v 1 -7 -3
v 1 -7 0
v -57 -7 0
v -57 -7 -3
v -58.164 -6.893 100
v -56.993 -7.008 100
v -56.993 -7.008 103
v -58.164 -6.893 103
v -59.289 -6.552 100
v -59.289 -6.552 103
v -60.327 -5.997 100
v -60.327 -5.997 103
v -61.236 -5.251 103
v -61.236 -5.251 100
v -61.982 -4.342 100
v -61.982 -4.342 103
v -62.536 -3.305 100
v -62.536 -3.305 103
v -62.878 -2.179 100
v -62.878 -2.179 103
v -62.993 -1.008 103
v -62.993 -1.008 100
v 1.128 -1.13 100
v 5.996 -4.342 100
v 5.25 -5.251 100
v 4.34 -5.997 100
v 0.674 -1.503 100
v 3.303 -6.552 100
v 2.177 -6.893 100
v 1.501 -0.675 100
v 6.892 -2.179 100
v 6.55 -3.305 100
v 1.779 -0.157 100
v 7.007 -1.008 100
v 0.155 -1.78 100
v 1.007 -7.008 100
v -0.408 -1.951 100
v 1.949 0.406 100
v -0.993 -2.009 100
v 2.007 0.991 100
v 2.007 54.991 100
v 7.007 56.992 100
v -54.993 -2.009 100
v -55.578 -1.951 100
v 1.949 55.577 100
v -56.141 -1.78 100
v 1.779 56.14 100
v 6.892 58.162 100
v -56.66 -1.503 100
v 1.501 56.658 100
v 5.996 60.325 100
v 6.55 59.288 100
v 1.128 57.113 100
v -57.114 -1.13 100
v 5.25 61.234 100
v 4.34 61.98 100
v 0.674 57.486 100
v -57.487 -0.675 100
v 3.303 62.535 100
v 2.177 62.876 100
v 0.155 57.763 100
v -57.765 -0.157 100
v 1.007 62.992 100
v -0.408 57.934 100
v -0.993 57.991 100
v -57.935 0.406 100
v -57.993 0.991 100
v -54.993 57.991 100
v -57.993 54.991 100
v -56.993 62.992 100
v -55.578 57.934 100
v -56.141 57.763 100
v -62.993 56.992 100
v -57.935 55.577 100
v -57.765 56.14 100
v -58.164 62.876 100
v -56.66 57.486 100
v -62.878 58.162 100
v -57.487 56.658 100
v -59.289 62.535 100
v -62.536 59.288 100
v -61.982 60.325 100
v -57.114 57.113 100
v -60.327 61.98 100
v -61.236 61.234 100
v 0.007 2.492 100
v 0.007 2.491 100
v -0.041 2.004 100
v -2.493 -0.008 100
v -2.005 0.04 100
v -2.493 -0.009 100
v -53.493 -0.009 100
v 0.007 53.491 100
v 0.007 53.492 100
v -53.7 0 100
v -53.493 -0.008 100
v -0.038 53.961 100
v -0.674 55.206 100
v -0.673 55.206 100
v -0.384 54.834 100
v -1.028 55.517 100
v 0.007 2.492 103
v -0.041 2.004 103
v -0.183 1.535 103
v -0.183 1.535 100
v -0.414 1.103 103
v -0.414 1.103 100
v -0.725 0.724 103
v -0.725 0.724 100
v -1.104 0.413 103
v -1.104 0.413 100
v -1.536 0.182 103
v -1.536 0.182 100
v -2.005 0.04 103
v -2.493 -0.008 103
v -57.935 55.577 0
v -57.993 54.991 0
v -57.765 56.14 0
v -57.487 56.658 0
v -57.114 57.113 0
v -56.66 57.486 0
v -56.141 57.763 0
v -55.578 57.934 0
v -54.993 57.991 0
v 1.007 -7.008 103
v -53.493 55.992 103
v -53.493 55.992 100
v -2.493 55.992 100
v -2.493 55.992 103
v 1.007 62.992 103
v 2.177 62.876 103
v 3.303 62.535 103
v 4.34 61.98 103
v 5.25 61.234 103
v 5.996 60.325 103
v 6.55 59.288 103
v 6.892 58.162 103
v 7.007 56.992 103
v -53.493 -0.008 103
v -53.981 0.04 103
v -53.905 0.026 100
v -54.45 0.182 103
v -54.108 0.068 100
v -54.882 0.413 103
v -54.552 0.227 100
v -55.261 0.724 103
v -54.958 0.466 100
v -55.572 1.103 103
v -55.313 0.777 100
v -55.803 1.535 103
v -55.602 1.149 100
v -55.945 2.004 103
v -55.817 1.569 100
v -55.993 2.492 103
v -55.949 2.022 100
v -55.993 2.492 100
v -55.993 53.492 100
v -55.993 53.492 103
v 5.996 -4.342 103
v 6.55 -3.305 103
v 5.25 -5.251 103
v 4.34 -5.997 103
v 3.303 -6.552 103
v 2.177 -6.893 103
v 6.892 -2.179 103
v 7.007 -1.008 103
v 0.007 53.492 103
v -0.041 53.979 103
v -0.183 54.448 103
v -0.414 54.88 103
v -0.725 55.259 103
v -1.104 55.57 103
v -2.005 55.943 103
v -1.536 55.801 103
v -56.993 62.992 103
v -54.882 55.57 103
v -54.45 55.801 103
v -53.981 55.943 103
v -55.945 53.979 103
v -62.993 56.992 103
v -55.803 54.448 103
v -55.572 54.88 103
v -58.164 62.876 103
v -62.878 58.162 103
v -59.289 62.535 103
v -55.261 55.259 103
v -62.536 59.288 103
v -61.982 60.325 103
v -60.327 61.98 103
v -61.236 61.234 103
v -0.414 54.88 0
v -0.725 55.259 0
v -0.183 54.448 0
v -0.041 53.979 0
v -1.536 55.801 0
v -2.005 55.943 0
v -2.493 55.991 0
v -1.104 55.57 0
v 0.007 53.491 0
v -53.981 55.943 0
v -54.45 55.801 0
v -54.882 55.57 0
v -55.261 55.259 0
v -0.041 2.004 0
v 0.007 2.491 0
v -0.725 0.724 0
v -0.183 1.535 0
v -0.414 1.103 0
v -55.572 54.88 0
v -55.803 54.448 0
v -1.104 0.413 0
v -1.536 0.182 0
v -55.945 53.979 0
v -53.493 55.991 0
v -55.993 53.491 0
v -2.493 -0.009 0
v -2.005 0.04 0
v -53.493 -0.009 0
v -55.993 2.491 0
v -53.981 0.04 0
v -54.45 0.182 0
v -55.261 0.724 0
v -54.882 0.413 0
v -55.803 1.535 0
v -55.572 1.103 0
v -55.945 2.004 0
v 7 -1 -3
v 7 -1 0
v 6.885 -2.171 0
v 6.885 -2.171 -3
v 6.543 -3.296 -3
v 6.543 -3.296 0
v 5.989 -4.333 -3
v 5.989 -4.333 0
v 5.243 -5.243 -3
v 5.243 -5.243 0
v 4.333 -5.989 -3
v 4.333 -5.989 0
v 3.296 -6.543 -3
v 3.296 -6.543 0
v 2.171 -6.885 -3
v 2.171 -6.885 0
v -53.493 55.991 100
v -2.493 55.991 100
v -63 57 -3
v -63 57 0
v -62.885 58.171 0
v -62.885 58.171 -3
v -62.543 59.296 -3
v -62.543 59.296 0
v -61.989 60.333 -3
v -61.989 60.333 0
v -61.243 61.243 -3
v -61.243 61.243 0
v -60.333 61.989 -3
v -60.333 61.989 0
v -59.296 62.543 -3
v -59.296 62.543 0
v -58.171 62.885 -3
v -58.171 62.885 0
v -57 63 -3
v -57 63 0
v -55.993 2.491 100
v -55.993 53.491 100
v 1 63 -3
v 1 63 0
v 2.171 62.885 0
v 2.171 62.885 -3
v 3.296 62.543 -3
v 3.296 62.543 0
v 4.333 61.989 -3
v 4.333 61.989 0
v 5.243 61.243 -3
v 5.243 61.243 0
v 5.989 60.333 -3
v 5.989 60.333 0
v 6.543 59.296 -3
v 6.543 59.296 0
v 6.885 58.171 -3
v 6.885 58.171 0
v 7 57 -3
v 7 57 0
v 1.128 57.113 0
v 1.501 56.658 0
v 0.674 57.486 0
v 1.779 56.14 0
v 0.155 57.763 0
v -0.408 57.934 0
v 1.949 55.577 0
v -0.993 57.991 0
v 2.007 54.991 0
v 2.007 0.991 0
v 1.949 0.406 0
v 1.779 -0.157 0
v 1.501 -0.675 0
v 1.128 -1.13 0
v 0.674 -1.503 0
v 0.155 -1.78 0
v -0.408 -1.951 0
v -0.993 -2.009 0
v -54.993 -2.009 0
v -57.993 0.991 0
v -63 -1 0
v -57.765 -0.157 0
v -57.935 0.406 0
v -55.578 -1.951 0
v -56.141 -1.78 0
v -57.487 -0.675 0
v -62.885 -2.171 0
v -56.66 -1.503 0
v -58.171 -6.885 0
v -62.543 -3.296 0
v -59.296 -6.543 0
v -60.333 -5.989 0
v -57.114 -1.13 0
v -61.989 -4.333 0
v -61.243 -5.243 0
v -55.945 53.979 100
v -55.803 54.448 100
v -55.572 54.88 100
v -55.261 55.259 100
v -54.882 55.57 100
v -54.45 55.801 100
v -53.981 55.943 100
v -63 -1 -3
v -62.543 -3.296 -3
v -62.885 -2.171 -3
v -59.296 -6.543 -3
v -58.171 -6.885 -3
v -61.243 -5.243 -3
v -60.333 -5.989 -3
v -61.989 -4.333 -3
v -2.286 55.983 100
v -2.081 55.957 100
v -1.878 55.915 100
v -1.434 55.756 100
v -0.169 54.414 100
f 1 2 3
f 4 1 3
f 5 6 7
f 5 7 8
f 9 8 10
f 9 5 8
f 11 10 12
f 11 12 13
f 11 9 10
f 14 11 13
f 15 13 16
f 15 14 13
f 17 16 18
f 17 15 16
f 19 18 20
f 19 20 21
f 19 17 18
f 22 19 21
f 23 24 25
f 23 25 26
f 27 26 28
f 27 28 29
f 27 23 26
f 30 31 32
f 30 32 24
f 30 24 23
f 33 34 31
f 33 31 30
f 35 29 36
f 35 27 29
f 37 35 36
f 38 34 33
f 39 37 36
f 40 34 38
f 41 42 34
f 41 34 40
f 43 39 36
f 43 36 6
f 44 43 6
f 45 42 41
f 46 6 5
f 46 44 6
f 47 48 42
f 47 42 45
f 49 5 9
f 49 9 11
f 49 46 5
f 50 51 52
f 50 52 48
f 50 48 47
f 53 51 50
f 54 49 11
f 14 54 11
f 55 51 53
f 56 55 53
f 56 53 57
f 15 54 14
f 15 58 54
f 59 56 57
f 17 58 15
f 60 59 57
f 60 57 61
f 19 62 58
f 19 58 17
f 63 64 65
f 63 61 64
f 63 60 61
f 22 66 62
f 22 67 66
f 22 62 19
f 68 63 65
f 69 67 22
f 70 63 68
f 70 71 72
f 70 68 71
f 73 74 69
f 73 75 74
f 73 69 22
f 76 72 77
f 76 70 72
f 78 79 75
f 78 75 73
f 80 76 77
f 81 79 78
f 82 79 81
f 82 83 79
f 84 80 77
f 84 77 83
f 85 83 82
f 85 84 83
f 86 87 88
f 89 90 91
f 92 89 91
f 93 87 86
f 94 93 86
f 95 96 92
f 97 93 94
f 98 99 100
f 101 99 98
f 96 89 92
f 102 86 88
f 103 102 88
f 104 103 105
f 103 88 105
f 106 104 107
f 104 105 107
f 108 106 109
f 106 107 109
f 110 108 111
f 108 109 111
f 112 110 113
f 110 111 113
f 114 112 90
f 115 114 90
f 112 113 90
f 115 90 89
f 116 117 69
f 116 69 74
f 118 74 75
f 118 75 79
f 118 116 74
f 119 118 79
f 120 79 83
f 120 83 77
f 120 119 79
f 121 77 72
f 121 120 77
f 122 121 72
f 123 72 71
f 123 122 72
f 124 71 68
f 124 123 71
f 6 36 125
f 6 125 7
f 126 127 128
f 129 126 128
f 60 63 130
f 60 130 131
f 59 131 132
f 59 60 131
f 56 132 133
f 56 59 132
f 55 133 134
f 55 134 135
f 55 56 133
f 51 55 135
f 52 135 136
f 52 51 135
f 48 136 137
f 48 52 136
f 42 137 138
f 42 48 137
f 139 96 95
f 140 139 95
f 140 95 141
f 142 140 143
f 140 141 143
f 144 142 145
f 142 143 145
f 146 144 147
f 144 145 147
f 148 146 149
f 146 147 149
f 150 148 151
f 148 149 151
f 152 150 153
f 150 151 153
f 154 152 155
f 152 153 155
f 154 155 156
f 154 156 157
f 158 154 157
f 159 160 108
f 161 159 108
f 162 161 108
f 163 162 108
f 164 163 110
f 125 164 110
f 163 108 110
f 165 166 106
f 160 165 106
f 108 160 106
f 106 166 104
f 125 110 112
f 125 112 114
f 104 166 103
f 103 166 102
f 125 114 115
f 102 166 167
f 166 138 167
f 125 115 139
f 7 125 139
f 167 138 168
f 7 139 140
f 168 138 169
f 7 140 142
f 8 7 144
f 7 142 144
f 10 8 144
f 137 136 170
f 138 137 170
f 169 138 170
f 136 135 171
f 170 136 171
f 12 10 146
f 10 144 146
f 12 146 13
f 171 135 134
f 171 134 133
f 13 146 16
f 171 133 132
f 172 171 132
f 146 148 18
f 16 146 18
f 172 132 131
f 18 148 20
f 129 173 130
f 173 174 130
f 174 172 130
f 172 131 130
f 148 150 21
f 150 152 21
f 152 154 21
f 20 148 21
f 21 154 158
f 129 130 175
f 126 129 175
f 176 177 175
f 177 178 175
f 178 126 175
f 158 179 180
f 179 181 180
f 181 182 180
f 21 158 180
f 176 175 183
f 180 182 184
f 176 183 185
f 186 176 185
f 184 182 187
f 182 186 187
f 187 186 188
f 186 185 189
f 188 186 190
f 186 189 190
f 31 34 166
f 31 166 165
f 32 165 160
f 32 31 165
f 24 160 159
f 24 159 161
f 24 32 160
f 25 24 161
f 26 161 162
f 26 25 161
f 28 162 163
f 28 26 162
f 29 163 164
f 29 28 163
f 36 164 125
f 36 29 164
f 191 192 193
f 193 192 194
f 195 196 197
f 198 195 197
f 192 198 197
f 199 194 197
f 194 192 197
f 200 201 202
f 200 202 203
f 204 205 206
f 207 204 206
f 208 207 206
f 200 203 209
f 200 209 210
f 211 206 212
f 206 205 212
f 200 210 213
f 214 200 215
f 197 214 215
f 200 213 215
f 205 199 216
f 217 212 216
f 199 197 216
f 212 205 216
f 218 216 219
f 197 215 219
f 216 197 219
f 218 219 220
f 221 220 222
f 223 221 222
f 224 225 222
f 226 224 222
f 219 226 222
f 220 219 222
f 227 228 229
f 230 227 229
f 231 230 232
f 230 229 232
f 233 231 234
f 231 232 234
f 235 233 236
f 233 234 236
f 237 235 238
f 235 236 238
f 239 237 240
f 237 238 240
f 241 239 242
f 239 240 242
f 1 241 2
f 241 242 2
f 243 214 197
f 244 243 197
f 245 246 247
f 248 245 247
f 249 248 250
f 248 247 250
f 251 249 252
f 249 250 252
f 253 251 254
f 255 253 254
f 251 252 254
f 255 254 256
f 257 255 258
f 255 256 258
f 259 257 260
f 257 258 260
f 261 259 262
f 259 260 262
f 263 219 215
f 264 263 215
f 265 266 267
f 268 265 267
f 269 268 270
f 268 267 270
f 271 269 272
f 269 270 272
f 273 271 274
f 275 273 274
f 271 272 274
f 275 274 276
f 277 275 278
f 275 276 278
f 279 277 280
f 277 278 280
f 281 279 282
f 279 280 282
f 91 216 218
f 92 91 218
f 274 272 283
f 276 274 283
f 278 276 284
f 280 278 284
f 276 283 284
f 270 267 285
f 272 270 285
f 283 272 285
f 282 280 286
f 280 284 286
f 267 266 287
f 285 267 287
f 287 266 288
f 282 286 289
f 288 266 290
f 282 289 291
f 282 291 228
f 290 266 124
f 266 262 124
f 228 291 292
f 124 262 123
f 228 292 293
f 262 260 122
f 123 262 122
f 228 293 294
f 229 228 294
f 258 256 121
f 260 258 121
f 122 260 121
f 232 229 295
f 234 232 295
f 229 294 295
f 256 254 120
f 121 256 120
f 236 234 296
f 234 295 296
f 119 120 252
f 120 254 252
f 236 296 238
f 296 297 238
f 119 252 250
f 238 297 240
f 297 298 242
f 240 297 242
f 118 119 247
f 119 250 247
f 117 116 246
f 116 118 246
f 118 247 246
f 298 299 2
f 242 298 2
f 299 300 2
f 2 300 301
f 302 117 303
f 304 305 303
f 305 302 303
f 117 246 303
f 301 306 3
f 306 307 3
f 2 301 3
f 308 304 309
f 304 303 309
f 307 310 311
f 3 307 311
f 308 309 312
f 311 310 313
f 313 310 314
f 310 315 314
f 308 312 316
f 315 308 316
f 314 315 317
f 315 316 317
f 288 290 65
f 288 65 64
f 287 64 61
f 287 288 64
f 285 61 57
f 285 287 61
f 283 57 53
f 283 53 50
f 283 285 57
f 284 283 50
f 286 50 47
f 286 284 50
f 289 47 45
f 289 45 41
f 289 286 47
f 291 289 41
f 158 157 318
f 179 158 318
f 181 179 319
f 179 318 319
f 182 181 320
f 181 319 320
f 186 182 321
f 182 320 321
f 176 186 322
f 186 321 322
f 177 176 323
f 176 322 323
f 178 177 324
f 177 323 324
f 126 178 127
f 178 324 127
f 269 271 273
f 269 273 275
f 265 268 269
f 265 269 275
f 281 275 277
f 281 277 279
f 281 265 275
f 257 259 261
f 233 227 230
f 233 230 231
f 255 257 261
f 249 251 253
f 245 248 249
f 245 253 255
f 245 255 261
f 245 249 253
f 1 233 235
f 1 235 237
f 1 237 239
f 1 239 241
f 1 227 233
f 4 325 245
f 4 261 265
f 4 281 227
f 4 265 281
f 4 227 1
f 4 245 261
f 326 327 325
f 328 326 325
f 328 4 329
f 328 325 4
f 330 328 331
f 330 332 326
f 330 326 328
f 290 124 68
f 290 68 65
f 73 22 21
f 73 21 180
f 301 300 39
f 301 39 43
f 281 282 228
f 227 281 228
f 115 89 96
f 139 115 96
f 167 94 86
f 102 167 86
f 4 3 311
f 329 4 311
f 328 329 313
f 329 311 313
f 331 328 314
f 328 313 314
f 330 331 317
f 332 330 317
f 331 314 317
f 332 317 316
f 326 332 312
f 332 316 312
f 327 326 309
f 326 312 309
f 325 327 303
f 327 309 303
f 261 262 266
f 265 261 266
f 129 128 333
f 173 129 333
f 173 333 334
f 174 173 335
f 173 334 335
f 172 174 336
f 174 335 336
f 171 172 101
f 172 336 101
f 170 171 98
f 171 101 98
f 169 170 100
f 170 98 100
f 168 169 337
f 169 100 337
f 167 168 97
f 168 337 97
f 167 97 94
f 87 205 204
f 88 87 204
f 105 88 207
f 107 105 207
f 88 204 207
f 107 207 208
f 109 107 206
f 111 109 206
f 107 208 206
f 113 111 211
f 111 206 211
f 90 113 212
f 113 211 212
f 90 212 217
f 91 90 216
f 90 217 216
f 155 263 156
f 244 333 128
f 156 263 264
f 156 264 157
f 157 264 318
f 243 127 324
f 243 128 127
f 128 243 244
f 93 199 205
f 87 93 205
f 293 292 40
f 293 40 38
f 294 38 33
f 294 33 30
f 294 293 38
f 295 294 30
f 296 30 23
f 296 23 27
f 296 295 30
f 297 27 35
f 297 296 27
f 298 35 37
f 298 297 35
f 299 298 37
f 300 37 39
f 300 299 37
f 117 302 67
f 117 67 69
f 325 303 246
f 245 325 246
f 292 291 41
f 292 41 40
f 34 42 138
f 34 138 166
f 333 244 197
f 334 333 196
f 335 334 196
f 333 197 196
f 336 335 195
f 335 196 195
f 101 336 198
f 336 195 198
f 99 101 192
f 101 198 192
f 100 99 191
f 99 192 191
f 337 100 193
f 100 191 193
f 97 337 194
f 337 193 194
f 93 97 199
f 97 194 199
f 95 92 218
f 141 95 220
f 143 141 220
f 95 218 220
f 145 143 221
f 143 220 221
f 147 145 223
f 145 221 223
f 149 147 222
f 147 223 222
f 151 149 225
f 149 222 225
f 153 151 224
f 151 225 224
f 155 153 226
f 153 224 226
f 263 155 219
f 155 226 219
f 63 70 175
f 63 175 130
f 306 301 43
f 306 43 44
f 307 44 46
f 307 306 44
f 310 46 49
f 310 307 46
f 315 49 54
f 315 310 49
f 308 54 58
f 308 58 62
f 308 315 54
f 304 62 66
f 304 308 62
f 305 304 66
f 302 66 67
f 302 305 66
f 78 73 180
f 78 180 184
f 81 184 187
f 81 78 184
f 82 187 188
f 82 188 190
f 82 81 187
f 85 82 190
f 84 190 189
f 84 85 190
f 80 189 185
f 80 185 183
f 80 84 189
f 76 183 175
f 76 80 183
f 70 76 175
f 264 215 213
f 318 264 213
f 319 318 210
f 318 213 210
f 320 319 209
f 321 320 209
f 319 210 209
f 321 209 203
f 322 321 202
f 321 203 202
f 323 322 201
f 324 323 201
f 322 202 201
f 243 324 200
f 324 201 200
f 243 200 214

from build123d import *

# Parameters (mm, degrees)
BOSS_EXTRUDE1_DEPTH = 3
BOSS_EXTRUDE2_DEPTH = 100
BOSS_EXTRUDE3_DEPTH = 3


with BuildPart() as part:
    # Sketch1 → Boss-Extrude1 (new body)
    with BuildSketch(Plane(origin=(0, 0, 0), x_dir=(0, 1, 0), z_dir=(0, 0, 1))):
        with BuildLine():
            Line((-1, 63), (57, 63))
            ThreePointArc((57, 63), (61.242640687, 61.242640687), (63, 57))
            Line((63, 57), (63, -1))
            ThreePointArc((63, -1), (61.242640687, -5.242640687), (57, -7))
            Line((57, -7), (-1, -7))
            ThreePointArc((-1, -7), (-5.242640687, -5.242640687), (-7, -1))
            Line((-7, -1), (-7, 57))
            ThreePointArc((-7, 57), (-5.242640687, 61.242640687), (-1, 63))
        make_face()
    extrude(amount=-BOSS_EXTRUDE1_DEPTH)

    # Sketch2 → Boss-Extrude2 (add)
    with BuildSketch(Plane.XY):
        with BuildLine():
            Line((-54.993031309, 57.991494042), (-0.993031309, 57.991494042))
            ThreePointArc((-0.993031309, 57.991494042), (1.128289034, 57.112814386), (2.006968691, 54.991494042))
            Line((2.006968691, 54.991494042), (2.006968691, 0.991494042))
            ThreePointArc((2.006968691, 0.991494042), (1.128289034, -1.129826302), (-0.993031309, -2.008505958))
            Line((-0.993031309, -2.008505958), (-54.993031309, -2.008505958))
            ThreePointArc((-54.993031309, -2.008505958), (-57.114351653, -1.129826302), (-57.993031309, 0.991494042))
            Line((-57.993031309, 0.991494042), (-57.993031309, 54.991494042))
            ThreePointArc((-57.993031309, 54.991494042), (-57.114351653, 57.112814386), (-54.993031309, 57.991494042))
        make_face()
        with BuildLine():
            Line((-55.993031309, 2.491494042), (-55.993031309, 53.491494042))
            ThreePointArc((-55.993031309, 53.491494042), (-55.260798262, 55.259260995), (-53.493031309, 55.991494042))
            Line((-53.493031309, 55.991494042), (-2.493031309, 55.991494042))
            ThreePointArc((-2.493031309, 55.991494042), (-0.725264356, 55.259260995), (0.006968691, 53.491494042))
            Line((0.006968691, 53.491494042), (0.006968691, 2.491494042))
            ThreePointArc((0.006968691, 2.491494042), (-0.725264356, 0.723727089), (-2.493031309, -0.008505958))
            Line((-2.493031309, -0.008505958), (-53.493031309, -0.008505958))
            ThreePointArc((-53.493031309, -0.008505958), (-55.260798262, 0.723727089), (-55.993031309, 2.491494042))
        make_face(mode=Mode.SUBTRACT)
    extrude(amount=BOSS_EXTRUDE2_DEPTH)

    # Sketch4 → Boss-Extrude3 (add)
    with BuildSketch(Plane.XY.offset(100)):
        with BuildLine():
            Line((-56.993104306, 62.991512558), (1.006895694, 62.991512558))
            ThreePointArc((1.006895694, 62.991512558), (5.249536381, 61.234153245), (7.006895694, 56.991512558))
            Line((7.006895694, 56.991512558), (7.006895694, -1.008487442))
            ThreePointArc((7.006895694, -1.008487442), (5.249536381, -5.251128129), (1.006895694, -7.008487442))
            Line((1.006895694, -7.008487442), (-56.993104306, -7.008487442))
            ThreePointArc((-56.993104306, -7.008487442), (-61.235744993, -5.251128129), (-62.993104306, -1.008487442))
            Line((-62.993104306, -1.008487442), (-62.993104306, 56.991512558))
            ThreePointArc((-62.993104306, 56.991512558), (-61.235744993, 61.234153245), (-56.993104306, 62.991512558))
        make_face()
        with BuildLine():
            Line((-55.993104306, 2.491512558), (-55.993104306, 53.491512558))
            ThreePointArc((-55.993104306, 53.491512558), (-55.260871259, 55.259279511), (-53.493104306, 55.991512558))
            Line((-53.493104306, 55.991512558), (-2.493104306, 55.991512558))
            ThreePointArc((-2.493104306, 55.991512558), (-0.725337353, 55.259279511), (0.006895694, 53.491512558))
            Line((0.006895694, 53.491512558), (0.006895694, 2.491512558))
            ThreePointArc((0.006895694, 2.491512558), (-0.725337353, 0.723745605), (-2.493104306, -0.008487442))
            Line((-2.493104306, -0.008487442), (-53.493104306, -0.008487442))
            ThreePointArc((-53.493104306, -0.008487442), (-55.260871259, 0.723745605), (-55.993104306, 2.491512558))
        make_face(mode=Mode.SUBTRACT)
    extrude(amount=BOSS_EXTRUDE3_DEPTH)


solid = part.part
